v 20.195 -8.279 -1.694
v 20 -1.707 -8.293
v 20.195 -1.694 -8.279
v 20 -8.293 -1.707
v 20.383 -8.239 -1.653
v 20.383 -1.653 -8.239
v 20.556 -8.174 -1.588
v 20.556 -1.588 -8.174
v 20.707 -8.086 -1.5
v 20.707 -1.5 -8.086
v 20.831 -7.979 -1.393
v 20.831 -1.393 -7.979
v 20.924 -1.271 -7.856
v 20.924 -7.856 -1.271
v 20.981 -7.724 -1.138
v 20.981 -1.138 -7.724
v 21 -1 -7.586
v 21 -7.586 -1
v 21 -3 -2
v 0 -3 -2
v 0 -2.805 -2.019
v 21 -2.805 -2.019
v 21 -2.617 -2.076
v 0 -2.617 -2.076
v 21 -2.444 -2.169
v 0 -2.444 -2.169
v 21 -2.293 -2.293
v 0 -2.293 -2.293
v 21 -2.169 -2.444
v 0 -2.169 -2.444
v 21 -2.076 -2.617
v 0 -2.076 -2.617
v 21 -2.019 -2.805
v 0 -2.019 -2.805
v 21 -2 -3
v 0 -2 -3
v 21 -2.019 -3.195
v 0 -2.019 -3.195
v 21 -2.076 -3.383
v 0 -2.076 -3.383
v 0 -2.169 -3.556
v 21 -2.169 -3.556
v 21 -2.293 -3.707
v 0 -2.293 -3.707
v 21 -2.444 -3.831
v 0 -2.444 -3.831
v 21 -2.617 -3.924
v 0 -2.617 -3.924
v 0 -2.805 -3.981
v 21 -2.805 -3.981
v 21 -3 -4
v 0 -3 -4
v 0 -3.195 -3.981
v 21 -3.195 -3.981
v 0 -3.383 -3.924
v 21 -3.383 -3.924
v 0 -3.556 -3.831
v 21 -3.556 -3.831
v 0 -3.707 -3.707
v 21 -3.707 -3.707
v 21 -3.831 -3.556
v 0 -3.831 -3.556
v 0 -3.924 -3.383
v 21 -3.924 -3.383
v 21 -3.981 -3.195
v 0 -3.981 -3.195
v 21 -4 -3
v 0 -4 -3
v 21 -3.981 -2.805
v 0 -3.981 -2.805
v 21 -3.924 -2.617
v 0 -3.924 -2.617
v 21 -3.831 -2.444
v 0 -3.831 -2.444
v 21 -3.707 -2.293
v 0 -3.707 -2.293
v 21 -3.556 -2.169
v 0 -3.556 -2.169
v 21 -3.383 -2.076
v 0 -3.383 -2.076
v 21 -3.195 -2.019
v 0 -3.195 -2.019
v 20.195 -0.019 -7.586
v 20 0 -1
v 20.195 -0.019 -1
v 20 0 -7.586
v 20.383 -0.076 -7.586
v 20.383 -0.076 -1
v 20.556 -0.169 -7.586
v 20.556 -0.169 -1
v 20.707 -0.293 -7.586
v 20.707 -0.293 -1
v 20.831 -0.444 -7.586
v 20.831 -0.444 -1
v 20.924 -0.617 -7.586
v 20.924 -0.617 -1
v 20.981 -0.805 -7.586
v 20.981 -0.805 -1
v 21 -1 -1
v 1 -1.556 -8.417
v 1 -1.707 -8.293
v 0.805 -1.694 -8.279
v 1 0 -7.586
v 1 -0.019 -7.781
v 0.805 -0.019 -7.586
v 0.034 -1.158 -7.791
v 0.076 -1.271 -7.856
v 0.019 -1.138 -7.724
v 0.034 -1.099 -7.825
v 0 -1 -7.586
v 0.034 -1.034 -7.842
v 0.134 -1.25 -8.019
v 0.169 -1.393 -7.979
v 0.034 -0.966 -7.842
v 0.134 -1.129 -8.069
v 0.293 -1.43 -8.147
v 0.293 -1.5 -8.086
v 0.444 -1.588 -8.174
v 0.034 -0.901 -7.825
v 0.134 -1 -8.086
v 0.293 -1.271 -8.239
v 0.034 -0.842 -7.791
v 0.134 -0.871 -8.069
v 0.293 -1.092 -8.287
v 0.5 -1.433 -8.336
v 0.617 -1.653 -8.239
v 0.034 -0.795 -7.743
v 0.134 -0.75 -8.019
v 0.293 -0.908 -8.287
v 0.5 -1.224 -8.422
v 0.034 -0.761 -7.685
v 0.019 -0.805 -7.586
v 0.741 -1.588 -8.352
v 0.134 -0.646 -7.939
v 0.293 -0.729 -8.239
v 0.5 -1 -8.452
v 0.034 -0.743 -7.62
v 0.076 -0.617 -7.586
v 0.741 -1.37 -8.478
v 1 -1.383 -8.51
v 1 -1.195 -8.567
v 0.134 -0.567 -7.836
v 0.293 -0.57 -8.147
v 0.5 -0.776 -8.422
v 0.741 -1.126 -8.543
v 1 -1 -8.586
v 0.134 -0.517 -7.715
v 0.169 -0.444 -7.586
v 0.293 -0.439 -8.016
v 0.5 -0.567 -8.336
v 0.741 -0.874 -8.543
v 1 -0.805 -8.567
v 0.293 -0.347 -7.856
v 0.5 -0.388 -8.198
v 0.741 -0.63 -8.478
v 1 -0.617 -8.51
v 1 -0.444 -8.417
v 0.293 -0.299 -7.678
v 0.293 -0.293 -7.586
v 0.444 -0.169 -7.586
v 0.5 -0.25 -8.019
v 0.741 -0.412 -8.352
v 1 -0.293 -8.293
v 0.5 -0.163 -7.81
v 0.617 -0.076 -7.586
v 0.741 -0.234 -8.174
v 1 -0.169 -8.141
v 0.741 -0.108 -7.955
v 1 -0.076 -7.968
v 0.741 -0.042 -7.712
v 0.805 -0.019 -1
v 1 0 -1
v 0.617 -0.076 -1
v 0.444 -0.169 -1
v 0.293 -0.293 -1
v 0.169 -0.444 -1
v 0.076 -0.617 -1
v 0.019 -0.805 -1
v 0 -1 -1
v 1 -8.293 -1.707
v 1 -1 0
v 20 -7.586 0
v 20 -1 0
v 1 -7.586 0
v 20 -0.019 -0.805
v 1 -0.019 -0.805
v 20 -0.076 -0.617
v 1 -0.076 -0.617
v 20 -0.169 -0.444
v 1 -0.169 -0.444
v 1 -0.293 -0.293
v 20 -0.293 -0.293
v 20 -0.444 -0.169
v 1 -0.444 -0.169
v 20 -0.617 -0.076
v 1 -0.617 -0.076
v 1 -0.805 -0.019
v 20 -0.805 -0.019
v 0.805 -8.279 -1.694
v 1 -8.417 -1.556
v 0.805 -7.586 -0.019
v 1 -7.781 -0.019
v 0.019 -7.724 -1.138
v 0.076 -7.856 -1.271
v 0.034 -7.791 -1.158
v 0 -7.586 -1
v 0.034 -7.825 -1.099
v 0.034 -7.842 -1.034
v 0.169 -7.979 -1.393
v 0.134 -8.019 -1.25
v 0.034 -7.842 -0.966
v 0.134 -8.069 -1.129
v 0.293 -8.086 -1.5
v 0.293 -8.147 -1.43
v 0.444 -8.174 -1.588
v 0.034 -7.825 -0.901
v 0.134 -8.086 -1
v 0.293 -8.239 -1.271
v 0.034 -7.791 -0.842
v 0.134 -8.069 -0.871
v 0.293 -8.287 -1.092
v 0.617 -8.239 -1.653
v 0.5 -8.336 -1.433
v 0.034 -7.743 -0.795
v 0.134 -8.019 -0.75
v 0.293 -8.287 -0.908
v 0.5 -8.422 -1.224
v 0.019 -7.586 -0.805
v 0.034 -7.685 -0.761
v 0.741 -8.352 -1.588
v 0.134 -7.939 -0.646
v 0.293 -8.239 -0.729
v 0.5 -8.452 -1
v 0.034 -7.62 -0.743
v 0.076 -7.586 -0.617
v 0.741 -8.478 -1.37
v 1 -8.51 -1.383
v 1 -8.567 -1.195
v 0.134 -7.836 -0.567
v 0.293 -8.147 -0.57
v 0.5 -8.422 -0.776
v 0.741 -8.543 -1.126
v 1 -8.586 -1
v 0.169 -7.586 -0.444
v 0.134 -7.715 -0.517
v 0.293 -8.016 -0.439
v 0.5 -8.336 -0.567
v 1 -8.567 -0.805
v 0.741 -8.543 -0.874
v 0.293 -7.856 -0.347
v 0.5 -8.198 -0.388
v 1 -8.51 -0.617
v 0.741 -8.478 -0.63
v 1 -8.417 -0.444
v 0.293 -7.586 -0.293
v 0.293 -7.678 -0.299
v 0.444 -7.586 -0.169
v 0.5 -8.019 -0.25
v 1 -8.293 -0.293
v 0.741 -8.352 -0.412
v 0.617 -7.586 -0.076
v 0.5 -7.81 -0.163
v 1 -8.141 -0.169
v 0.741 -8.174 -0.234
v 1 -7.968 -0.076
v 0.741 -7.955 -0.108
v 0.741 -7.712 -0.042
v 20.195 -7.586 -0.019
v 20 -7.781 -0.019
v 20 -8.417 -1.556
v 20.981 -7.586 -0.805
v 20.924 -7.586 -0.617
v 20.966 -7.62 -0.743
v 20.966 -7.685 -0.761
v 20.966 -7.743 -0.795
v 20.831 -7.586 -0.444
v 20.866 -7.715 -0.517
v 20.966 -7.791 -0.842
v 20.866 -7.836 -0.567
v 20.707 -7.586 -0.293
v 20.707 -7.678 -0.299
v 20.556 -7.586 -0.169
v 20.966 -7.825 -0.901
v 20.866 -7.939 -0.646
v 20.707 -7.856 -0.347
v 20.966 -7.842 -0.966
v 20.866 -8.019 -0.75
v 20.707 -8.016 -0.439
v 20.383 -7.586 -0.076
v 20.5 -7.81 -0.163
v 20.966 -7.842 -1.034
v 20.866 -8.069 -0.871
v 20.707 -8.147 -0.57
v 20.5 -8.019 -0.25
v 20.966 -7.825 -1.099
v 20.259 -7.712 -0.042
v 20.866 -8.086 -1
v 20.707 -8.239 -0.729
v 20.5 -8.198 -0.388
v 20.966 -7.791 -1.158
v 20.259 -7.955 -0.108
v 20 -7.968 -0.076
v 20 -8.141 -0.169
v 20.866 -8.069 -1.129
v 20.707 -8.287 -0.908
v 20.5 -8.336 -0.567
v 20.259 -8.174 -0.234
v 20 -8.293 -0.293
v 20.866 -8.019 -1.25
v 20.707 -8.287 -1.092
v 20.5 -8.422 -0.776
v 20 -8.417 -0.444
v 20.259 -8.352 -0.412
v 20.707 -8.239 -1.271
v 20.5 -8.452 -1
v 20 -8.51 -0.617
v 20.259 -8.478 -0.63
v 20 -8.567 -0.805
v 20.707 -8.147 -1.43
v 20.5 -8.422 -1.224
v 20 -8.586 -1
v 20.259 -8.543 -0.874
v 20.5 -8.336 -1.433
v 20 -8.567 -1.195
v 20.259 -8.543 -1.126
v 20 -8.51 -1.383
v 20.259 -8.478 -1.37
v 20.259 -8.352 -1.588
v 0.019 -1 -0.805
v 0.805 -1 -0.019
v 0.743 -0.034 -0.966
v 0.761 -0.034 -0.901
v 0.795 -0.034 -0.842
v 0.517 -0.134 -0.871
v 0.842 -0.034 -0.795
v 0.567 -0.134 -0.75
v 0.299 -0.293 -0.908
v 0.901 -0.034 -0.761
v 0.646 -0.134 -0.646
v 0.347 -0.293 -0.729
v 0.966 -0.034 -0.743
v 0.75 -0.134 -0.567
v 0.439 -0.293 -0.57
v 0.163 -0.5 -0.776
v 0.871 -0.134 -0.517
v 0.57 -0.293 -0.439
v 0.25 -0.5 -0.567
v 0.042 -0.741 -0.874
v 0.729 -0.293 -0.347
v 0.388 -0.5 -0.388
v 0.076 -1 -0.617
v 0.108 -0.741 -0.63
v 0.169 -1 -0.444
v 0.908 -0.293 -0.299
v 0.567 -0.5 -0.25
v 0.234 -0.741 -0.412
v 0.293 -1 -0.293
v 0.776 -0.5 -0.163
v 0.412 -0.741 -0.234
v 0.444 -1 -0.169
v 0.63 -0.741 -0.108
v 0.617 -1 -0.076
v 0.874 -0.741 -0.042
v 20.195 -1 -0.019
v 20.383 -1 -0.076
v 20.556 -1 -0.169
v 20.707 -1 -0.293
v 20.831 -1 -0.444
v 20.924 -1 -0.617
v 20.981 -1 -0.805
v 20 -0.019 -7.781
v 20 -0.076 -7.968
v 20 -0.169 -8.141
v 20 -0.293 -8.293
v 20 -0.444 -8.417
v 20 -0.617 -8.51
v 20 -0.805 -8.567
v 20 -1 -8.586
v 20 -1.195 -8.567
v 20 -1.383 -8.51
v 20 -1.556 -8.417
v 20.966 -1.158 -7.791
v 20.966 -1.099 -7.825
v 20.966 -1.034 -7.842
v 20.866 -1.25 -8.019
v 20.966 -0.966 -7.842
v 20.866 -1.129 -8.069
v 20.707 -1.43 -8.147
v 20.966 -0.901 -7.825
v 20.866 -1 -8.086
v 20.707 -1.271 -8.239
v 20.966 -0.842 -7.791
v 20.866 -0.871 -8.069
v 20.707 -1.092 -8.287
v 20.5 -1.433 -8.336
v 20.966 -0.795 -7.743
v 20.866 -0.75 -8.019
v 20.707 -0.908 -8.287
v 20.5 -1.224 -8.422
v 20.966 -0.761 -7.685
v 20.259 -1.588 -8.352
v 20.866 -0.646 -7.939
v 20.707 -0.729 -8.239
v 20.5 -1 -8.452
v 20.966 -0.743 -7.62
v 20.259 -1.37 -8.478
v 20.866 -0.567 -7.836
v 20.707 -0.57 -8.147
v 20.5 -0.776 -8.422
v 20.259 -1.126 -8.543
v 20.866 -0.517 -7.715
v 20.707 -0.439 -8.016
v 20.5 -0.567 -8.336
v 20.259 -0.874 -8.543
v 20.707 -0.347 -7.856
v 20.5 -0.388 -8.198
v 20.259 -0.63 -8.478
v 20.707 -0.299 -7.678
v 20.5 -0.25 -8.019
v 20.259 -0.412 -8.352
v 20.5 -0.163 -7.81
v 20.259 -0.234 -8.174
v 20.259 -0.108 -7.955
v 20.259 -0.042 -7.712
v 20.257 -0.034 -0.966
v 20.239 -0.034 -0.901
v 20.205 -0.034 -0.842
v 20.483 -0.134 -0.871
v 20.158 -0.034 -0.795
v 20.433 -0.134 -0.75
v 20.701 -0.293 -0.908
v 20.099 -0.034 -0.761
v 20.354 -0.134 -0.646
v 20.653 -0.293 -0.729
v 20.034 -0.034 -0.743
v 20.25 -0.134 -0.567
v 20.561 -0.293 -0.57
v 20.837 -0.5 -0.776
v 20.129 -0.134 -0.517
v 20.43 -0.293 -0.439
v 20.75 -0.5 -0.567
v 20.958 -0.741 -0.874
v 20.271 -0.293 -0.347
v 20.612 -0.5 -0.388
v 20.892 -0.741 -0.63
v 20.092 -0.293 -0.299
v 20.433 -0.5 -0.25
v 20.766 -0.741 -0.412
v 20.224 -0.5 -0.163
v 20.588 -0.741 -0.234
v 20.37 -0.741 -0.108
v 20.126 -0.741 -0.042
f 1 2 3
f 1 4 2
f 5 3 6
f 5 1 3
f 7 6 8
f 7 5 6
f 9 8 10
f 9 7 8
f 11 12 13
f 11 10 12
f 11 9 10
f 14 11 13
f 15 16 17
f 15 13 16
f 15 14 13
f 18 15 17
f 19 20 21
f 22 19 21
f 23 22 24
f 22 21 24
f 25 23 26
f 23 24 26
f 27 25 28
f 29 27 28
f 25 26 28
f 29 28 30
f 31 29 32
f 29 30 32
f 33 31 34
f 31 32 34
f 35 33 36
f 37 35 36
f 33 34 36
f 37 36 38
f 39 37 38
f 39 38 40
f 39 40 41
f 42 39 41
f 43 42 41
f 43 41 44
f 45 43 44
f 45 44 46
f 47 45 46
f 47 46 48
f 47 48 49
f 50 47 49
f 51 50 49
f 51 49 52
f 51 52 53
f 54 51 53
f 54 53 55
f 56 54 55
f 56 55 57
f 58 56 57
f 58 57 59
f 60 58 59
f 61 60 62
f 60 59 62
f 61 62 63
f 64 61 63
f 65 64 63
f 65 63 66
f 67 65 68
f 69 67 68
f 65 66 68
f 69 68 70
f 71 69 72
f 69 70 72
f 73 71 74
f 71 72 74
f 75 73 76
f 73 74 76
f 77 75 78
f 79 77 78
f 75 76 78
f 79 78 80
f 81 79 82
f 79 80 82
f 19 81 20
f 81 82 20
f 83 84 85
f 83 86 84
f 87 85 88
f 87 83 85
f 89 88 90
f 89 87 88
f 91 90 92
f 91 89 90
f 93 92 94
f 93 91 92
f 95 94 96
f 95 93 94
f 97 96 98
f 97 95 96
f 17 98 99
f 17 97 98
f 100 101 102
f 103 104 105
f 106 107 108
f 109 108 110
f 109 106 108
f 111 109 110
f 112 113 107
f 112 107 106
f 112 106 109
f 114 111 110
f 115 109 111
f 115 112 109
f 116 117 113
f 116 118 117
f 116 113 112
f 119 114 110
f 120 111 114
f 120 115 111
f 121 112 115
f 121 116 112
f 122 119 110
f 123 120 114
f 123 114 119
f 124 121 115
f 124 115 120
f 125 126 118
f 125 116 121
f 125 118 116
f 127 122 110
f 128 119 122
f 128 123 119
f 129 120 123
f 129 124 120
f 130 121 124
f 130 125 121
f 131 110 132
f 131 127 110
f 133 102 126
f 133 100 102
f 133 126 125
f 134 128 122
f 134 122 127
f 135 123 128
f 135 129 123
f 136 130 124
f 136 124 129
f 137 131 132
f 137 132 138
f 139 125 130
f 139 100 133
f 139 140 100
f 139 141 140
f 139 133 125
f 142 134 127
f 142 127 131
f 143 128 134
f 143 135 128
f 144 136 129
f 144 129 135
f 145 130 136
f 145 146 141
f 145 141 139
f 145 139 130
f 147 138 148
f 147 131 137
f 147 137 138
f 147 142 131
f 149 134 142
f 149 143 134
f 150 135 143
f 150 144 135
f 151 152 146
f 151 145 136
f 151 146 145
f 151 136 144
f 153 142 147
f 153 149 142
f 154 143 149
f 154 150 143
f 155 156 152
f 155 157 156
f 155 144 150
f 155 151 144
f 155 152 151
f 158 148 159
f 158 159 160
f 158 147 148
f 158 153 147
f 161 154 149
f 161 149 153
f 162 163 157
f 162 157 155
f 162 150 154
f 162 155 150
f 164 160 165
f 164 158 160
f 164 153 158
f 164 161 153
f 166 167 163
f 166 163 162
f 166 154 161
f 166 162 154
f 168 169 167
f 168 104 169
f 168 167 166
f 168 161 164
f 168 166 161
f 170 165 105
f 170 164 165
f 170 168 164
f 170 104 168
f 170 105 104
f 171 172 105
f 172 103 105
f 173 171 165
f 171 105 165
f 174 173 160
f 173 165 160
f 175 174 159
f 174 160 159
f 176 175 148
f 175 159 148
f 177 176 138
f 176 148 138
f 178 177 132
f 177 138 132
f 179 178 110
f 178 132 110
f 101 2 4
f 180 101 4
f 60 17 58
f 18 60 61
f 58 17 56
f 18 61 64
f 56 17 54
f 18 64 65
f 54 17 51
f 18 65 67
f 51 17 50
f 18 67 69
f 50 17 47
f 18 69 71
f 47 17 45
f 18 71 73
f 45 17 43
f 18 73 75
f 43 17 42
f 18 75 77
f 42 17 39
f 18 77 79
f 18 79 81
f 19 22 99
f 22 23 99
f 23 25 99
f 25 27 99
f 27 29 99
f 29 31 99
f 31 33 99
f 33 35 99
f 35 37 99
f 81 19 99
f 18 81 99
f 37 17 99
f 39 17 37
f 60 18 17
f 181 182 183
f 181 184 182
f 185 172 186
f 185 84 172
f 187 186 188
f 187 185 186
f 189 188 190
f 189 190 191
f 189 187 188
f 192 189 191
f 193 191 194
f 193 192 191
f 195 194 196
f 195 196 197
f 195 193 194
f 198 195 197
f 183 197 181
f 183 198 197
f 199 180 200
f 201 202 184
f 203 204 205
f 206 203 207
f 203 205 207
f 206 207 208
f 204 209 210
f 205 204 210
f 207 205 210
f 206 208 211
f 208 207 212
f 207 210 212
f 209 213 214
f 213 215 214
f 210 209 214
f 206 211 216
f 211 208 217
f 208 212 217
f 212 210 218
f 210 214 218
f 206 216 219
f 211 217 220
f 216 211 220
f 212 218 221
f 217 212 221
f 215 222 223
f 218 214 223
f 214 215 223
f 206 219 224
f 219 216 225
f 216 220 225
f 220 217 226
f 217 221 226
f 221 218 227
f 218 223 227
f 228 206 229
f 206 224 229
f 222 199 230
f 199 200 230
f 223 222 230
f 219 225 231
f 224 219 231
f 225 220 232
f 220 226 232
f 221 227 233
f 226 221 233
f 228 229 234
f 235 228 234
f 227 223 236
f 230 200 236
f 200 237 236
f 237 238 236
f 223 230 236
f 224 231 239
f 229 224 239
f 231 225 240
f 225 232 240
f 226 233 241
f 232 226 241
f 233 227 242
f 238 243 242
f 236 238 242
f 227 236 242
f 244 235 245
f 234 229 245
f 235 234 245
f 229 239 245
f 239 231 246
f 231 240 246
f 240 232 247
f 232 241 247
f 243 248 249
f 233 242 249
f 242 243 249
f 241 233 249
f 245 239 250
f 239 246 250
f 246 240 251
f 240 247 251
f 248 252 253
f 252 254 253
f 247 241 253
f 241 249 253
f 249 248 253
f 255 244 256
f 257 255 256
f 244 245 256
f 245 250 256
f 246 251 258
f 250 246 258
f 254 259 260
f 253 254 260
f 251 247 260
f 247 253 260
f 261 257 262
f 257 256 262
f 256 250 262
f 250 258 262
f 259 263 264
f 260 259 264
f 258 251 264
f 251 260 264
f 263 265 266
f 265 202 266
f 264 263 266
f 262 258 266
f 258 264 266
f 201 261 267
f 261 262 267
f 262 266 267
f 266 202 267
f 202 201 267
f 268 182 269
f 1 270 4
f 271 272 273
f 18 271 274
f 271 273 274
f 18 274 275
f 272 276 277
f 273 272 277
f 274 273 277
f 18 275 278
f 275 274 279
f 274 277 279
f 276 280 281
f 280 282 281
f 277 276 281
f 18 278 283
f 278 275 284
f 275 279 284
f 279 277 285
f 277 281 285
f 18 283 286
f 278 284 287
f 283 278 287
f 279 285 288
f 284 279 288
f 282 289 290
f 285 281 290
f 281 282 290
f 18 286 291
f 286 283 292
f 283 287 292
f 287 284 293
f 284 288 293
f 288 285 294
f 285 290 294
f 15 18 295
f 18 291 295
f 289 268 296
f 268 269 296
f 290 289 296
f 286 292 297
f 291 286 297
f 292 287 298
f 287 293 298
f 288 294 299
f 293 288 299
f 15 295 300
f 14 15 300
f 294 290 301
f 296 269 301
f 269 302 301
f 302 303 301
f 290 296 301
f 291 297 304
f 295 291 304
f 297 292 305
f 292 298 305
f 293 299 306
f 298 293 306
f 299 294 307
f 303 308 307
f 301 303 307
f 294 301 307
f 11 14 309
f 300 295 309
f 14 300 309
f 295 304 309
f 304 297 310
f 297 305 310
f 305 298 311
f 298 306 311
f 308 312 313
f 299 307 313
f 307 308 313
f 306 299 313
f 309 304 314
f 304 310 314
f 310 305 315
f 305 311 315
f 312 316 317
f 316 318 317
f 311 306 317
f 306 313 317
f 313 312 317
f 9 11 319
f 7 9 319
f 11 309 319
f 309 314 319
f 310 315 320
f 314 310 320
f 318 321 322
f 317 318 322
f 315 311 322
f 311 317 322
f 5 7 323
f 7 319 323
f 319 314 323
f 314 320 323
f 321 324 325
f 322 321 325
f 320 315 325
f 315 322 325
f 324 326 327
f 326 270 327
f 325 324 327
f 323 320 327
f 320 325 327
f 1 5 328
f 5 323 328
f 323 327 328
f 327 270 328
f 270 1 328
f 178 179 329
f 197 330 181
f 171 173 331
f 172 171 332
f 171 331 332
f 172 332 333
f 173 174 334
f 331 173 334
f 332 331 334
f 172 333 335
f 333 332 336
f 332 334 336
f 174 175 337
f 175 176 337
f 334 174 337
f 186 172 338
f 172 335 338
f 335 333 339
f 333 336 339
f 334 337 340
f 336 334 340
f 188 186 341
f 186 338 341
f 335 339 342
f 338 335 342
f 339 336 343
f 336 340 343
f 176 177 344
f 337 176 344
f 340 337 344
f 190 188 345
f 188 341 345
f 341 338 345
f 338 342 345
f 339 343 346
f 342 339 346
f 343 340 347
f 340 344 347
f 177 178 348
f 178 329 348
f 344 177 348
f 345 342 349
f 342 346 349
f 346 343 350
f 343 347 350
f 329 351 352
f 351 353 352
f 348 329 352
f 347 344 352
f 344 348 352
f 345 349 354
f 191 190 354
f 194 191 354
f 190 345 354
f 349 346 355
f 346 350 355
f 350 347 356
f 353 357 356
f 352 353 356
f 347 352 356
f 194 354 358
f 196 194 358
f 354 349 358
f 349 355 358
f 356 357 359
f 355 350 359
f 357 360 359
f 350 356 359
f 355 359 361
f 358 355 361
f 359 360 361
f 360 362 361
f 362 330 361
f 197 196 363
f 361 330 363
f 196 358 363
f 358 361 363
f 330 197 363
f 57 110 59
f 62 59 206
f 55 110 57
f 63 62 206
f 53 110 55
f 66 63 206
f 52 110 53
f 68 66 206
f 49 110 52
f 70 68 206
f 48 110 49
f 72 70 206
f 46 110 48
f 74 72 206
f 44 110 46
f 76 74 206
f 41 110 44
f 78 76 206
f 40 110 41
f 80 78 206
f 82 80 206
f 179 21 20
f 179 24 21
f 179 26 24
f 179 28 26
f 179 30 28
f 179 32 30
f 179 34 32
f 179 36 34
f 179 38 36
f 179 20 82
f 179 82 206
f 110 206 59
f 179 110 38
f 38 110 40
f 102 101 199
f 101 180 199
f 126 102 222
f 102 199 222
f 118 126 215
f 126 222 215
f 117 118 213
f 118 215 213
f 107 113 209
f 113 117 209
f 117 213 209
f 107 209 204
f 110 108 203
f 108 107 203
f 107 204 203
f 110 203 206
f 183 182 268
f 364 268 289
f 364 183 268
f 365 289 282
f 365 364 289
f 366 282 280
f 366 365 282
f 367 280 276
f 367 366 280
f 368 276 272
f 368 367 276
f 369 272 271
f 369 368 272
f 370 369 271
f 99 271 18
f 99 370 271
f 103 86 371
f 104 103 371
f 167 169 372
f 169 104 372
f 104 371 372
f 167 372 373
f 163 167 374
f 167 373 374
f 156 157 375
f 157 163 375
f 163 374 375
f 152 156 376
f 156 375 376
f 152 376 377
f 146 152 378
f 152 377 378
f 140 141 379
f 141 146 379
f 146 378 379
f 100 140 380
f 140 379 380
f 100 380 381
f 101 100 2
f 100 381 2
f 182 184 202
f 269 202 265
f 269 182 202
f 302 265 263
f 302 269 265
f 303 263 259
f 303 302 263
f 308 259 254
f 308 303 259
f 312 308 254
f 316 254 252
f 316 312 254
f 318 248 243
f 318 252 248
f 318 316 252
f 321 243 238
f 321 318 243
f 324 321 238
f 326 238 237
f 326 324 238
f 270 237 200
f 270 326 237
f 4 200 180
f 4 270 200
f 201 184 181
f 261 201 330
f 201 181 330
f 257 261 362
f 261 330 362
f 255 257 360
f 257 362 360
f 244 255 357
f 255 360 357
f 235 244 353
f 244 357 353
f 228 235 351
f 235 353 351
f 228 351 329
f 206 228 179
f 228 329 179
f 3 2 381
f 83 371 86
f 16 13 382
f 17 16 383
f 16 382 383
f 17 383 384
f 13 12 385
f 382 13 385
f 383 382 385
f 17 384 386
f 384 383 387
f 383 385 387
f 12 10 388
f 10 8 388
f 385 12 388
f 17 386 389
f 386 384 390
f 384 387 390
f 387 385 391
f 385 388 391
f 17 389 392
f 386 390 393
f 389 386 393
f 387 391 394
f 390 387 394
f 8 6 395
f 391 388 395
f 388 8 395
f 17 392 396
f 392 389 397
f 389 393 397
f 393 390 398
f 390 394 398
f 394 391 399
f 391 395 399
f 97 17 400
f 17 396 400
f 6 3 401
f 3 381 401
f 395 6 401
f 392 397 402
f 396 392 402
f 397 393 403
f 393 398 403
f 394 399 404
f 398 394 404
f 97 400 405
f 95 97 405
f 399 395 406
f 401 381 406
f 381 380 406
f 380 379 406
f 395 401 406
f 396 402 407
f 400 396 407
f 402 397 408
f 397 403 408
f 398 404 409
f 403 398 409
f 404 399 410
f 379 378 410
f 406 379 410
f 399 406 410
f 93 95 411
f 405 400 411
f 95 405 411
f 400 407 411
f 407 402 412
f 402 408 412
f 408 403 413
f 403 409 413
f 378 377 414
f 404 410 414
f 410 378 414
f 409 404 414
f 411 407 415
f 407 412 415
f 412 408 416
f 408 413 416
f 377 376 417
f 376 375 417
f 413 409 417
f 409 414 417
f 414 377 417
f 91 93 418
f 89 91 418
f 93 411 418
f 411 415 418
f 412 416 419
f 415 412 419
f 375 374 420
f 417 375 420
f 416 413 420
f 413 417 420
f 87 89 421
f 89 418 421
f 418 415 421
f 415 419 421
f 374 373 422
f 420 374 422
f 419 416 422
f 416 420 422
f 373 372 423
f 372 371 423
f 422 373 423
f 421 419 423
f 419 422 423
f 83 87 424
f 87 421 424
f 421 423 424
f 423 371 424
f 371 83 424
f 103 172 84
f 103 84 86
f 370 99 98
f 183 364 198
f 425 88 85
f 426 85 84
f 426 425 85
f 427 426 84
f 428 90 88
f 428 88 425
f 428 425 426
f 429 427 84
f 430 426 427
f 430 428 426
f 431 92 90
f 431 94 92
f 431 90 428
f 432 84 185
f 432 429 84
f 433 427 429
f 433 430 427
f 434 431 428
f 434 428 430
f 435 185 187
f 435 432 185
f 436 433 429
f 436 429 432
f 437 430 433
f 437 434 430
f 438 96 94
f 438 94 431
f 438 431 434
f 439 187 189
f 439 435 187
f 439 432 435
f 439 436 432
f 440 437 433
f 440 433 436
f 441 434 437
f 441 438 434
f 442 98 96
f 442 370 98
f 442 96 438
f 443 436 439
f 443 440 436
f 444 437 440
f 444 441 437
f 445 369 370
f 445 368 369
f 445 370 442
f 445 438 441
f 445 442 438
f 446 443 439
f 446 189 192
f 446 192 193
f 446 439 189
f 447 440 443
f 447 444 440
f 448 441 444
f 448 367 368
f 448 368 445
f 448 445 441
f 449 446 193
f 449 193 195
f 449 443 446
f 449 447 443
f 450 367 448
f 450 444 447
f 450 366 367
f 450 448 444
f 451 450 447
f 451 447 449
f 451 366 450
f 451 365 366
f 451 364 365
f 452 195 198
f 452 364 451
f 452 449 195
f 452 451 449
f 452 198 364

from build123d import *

# Parameters (mm, degrees)
BODY_DEPTH      = 21
SKETCH2_R       = 1
BOLT_HOLE_DEPTH = 22
EDGE_FILLETS_R  = 1


with BuildPart() as part:
    # Sketch1 → body (new body)
    with BuildSketch(Plane(origin=(0, 0, 0), x_dir=(0, 0, -1), z_dir=(1, 0, 0))):
        Polygon((0, 0), (10, 0), (0, -10), align=None)
    extrude(amount=BODY_DEPTH)

    # Sketch2 → bolt_hole (cut, through all)
    with BuildSketch(Plane.ZY):
        with Locations((-3, -3)):
            Circle(SKETCH2_R)
    extrude(amount=-BOLT_HOLE_DEPTH, mode=Mode.SUBTRACT)

    # edge_fillets
    edge_fillets_edges = [part.edges().sort_by_distance(p)[0] for p in [
        (21, -5, 0),
        (21, -5, -5),
        (0, -5, -5),
        (0, -5, 0),
        (0, 0, -5),
        (21, 0, -5),
        (10.5, 0, -10),
        (10.5, -10, 0),
        (10.5, 0, 0),
    ]]
    fillet(edge_fillets_edges, radius=EDGE_FILLETS_R)


solid = part.part
